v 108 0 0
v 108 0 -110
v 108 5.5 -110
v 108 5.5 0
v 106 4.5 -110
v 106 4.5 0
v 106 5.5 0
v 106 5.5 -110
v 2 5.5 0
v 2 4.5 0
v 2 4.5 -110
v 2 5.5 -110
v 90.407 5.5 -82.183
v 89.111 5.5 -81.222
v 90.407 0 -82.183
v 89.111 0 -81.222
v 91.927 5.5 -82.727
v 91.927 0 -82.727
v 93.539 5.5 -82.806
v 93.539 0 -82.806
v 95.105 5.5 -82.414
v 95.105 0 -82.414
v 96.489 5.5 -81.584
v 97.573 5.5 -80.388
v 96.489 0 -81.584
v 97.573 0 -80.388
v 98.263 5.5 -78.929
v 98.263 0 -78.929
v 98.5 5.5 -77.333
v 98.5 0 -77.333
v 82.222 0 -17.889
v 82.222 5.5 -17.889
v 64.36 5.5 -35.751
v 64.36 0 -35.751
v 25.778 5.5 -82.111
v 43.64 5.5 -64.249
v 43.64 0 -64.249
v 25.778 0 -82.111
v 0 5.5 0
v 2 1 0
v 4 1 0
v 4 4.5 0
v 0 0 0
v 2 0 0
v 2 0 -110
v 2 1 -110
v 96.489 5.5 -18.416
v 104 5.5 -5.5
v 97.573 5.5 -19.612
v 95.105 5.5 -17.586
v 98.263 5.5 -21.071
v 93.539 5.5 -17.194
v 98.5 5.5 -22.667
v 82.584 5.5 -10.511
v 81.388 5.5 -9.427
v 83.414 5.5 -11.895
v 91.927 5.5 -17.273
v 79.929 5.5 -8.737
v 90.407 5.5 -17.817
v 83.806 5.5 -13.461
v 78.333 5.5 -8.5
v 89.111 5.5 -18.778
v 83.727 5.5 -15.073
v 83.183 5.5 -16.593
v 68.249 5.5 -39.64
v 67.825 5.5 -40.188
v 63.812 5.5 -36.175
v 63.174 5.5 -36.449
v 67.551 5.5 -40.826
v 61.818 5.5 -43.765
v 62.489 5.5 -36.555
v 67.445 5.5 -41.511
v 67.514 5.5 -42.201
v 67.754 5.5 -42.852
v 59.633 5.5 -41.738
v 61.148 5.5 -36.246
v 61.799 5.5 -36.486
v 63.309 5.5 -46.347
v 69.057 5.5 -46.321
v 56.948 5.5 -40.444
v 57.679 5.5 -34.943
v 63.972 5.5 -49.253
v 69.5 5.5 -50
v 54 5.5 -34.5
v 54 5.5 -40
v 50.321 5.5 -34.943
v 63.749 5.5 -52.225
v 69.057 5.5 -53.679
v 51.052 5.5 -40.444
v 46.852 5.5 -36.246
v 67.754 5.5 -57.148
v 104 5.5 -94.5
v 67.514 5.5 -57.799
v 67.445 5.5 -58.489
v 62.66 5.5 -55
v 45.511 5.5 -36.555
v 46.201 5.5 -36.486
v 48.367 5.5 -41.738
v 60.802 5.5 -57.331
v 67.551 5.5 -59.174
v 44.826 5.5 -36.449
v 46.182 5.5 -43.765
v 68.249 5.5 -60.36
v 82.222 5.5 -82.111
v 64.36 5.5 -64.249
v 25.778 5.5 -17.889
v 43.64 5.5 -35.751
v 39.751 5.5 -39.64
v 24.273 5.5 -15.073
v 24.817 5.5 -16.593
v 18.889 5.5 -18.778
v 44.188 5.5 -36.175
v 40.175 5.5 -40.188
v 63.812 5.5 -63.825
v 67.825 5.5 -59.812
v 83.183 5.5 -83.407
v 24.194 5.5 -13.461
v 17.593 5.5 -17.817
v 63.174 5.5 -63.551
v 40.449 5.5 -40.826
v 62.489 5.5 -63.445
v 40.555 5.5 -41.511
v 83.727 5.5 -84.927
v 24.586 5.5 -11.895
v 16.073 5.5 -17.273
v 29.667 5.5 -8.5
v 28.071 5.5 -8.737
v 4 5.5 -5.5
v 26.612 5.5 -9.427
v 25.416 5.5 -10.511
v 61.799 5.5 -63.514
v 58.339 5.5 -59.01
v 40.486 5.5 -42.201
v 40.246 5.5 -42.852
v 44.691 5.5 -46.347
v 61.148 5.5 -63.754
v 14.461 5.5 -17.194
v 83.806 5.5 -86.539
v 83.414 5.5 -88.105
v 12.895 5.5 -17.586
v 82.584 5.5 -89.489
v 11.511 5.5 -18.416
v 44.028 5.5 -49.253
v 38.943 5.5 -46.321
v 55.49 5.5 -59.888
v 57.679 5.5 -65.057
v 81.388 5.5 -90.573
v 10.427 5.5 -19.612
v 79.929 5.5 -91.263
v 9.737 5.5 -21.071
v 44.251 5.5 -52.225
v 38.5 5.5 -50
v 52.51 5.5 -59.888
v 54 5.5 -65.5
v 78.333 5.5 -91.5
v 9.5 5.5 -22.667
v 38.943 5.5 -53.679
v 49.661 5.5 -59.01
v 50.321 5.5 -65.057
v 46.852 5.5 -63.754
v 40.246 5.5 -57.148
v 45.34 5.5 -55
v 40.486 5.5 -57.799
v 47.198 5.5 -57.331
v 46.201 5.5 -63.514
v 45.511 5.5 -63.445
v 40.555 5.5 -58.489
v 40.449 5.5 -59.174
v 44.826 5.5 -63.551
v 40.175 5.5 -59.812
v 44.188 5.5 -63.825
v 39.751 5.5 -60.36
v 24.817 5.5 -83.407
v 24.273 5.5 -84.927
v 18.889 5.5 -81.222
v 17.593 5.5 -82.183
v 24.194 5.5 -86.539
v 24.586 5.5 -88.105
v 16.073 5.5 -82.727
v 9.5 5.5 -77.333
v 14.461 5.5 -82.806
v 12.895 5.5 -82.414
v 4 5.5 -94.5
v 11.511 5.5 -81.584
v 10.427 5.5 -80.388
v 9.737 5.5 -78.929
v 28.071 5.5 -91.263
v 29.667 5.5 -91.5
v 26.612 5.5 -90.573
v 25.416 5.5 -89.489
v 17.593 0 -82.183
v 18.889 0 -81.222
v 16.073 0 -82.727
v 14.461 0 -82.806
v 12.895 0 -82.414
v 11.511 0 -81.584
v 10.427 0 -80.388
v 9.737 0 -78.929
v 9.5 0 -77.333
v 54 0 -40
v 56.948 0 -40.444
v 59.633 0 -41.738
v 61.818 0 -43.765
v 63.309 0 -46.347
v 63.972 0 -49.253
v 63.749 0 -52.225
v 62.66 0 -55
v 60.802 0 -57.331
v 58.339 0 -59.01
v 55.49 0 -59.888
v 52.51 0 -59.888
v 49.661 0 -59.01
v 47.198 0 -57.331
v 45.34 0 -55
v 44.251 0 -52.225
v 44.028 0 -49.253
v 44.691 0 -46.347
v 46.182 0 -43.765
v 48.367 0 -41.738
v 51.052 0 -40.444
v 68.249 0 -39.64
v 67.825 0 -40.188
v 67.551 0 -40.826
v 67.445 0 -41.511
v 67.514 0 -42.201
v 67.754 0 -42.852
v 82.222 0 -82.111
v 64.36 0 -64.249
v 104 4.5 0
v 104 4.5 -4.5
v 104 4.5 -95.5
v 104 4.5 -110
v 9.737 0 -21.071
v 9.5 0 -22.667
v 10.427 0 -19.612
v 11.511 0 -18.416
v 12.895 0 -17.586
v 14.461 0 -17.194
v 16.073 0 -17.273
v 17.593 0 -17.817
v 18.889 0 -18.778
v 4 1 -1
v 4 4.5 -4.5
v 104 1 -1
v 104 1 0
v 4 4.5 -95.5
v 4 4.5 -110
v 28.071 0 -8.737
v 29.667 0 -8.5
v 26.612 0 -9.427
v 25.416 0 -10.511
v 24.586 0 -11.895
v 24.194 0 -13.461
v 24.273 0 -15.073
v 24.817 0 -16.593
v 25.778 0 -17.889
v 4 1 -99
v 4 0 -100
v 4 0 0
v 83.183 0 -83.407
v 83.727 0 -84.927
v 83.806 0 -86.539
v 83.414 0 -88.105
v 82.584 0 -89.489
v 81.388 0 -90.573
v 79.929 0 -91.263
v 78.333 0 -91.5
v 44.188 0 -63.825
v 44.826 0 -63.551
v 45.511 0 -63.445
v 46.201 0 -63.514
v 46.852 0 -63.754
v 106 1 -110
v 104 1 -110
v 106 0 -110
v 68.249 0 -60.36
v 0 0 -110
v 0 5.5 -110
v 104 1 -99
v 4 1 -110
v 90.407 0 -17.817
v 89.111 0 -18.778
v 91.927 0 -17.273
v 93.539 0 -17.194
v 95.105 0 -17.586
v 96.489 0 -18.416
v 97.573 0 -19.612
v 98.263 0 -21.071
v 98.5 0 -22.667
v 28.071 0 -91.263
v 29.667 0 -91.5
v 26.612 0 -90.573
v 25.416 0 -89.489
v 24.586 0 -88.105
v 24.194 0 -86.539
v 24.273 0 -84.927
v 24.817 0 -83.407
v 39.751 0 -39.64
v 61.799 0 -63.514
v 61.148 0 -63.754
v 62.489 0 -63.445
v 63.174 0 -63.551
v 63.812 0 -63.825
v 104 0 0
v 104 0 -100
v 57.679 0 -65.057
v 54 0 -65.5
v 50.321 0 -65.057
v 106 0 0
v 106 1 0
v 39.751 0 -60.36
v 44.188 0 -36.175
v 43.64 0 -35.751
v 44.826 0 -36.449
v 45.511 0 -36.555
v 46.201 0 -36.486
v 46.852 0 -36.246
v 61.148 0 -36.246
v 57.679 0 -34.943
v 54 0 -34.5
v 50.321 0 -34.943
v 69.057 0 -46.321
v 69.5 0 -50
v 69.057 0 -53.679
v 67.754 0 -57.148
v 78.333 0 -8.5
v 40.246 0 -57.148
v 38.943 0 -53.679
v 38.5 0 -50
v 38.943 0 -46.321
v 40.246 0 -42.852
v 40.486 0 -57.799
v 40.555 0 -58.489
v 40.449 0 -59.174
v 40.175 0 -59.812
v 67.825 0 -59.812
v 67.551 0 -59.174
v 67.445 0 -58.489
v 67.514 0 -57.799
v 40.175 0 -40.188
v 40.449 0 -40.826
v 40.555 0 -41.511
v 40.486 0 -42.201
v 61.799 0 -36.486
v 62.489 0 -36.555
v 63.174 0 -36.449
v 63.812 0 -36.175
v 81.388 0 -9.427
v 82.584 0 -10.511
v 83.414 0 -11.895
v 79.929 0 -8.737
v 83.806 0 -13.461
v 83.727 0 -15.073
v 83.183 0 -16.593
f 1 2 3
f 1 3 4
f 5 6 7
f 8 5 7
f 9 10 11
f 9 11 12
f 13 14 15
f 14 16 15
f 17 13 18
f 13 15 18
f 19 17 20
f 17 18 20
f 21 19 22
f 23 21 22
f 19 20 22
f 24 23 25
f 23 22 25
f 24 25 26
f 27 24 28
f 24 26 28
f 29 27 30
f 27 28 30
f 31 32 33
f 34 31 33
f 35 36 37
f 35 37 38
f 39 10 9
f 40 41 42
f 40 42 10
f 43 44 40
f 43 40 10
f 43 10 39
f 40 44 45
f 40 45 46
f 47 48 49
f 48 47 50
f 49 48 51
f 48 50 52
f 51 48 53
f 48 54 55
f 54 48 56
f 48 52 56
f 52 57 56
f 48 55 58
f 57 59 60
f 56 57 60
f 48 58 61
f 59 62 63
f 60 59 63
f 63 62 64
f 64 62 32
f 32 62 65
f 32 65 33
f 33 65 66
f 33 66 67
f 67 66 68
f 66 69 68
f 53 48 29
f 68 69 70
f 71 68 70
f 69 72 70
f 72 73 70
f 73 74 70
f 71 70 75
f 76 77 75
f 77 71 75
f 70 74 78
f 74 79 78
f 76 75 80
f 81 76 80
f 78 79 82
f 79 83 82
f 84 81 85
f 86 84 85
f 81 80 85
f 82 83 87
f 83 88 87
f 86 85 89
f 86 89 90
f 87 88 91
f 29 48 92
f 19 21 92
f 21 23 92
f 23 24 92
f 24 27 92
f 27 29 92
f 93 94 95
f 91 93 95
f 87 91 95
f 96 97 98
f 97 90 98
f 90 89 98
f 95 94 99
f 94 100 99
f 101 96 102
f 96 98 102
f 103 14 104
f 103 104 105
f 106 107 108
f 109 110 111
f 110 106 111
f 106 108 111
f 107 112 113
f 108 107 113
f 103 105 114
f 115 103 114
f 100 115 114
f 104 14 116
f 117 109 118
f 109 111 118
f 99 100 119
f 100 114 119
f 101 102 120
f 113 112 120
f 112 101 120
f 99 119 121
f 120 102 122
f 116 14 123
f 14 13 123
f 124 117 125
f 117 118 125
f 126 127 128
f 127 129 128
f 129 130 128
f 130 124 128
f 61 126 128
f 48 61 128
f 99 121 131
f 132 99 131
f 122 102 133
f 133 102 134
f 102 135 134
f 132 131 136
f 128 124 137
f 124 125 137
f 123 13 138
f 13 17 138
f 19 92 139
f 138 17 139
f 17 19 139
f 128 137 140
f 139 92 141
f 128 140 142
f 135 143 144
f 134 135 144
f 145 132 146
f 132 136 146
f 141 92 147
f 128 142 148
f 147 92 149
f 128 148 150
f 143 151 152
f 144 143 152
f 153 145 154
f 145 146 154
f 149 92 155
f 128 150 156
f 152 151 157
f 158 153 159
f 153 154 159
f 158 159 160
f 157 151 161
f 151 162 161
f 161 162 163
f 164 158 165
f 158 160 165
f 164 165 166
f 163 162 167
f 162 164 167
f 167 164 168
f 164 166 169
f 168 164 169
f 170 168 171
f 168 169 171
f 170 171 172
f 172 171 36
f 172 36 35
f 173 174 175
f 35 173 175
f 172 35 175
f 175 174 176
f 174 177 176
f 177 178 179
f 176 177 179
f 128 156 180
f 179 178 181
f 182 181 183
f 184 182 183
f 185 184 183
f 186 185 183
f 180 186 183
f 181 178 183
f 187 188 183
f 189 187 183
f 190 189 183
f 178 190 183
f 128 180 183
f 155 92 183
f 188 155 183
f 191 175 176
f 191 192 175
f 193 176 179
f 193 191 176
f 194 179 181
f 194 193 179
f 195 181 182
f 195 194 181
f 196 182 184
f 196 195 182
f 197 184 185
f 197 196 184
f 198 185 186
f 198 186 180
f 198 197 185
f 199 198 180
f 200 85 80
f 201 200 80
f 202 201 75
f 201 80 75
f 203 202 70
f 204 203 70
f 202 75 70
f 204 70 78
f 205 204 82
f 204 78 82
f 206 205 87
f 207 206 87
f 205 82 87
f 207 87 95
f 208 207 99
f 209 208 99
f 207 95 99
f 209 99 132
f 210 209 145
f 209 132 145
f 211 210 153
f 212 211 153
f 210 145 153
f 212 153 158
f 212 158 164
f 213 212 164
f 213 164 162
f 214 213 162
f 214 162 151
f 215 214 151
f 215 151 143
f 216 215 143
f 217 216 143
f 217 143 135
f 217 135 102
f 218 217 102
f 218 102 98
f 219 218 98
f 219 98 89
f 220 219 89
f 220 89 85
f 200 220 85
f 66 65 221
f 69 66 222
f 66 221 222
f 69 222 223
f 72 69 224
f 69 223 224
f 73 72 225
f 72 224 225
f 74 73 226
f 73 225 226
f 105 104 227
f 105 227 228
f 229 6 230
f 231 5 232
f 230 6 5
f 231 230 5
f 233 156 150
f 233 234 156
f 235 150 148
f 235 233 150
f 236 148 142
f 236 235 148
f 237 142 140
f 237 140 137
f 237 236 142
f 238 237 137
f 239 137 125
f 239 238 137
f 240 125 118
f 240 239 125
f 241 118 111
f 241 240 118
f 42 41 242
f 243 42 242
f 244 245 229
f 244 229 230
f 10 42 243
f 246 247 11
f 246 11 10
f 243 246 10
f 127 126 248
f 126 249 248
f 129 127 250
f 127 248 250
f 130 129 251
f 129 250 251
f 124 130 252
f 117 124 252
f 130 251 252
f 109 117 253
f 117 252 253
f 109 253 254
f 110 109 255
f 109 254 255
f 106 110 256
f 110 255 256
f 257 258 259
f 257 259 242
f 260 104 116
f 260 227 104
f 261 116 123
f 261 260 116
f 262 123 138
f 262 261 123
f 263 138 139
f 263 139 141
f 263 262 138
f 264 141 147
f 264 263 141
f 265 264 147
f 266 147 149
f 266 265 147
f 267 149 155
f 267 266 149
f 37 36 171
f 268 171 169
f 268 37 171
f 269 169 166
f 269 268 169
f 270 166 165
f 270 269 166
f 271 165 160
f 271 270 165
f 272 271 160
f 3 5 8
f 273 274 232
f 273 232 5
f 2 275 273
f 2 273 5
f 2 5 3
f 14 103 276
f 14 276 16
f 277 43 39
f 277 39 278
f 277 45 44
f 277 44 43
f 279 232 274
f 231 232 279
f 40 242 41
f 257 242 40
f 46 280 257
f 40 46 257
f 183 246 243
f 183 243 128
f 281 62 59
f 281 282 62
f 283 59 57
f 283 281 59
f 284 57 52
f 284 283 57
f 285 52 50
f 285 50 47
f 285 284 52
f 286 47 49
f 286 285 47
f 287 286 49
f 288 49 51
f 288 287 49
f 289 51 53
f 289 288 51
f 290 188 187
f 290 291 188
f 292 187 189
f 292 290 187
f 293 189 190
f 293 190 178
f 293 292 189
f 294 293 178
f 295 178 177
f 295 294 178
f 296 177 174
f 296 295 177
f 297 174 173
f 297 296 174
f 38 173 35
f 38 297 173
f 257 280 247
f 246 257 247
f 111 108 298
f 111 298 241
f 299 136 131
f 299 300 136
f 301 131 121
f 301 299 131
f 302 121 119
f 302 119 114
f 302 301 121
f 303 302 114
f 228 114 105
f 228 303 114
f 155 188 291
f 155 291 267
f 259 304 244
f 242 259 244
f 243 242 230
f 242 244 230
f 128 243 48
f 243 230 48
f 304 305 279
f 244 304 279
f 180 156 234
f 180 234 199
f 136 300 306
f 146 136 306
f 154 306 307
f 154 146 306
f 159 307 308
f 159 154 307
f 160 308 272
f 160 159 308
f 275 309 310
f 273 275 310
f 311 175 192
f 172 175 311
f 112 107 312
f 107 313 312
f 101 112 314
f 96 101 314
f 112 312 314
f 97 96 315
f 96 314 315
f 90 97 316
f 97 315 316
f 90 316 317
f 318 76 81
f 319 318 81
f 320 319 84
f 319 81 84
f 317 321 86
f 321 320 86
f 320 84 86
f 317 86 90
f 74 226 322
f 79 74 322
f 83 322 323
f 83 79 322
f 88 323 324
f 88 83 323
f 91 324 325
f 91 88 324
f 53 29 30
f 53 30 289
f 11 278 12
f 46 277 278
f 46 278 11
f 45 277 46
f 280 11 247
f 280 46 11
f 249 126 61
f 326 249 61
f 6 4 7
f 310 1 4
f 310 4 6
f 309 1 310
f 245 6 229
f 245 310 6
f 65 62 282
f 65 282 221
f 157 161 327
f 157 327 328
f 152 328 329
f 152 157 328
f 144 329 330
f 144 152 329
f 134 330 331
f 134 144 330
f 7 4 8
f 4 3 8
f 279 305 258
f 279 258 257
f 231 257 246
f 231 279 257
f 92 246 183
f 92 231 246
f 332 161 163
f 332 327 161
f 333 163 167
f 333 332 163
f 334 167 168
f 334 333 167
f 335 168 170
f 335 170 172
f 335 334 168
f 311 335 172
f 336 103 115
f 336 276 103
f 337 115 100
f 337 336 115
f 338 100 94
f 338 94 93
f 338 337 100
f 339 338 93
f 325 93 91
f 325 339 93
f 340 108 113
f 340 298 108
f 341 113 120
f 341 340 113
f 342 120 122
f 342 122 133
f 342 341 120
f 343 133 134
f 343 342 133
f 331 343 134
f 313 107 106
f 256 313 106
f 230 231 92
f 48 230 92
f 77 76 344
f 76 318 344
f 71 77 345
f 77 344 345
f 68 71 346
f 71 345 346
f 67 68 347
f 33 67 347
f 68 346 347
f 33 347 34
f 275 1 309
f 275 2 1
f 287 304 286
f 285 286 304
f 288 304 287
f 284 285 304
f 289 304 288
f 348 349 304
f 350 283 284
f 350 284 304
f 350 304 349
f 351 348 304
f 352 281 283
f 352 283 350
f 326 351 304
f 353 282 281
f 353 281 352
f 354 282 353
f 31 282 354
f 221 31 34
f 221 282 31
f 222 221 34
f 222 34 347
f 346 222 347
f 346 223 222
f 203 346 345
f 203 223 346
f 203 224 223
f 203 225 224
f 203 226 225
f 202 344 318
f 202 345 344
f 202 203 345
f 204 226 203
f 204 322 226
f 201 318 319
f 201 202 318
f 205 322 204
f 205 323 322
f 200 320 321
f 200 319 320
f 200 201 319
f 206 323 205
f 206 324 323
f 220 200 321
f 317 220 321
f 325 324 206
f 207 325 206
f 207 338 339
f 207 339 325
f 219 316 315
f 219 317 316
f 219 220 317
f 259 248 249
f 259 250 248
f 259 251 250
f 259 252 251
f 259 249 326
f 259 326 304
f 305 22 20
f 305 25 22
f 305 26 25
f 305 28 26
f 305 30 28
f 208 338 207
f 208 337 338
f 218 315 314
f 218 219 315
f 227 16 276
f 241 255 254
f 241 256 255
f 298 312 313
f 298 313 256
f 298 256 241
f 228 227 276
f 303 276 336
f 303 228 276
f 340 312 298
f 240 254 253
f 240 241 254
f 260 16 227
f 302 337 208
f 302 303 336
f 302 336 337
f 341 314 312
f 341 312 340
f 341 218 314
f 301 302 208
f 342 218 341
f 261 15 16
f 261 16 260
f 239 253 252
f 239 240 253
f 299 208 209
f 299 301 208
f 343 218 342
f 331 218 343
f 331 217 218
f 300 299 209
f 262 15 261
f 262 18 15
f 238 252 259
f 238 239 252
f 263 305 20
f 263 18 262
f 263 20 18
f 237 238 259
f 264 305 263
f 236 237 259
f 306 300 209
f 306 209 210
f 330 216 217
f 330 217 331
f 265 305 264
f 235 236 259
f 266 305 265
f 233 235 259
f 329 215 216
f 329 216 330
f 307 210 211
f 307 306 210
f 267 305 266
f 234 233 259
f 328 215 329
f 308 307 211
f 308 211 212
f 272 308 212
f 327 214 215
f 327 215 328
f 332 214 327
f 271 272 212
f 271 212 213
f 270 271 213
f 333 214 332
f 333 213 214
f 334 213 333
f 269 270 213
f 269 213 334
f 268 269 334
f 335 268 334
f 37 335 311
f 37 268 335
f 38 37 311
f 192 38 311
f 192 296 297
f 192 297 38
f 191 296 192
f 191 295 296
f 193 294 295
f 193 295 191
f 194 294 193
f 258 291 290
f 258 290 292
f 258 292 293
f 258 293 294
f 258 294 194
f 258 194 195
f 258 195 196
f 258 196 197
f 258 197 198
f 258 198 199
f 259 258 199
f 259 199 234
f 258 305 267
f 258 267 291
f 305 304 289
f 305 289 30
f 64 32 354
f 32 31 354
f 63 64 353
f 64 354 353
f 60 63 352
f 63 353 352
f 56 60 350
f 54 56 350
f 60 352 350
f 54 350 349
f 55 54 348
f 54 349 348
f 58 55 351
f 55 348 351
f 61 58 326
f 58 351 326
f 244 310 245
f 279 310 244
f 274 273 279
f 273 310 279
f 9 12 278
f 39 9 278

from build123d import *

# Parameters (mm, degrees)
BOSS_EXTRUDE1_DEPTH = 5.5
SKETCH4_W           = 2
SKETCH4_H           = 1
CUT_EXTRUDE2_DEPTH  = 110
SKETCH5_R           = 10
CUT_EXTRUDE3_DEPTH  = 110
CUT_EXTRUDE4_START  = -4
CUT_EXTRUDE4_DEPTH  = 100
FILLET3_R           = 5.5
FILLET4_R           = 2.75


with BuildPart() as part:
    # Sketch1 → Boss-Extrude1 (new body)
    with BuildSketch(Plane(origin=(0, 0, 0), x_dir=(1, 0, 0), z_dir=(0, 1, 0))):
        Polygon((0, 110), (4, 110), (4, 100), (104, 100), (104, 110), (108, 110), (108, 0), (0, 0), align=None)
    extrude(amount=BOSS_EXTRUDE1_DEPTH)

    # Sketch4 → Cut-Extrude2 (cut)
    with BuildSketch(Plane(origin=(0, 0, -110), x_dir=(-1, 0, 0), z_dir=(0, 0, -1))):
        with Locations((-3, 0.5)):
            Rectangle(SKETCH4_W, SKETCH4_H)
        with Locations((-3, 5)):
            Rectangle(SKETCH4_W, SKETCH4_H)
        with Locations((-105, 5)):
            Rectangle(SKETCH4_W, SKETCH4_H)
        with Locations((-105, 0.5)):
            Rectangle(SKETCH4_W, SKETCH4_H)
    extrude(amount=-CUT_EXTRUDE2_DEPTH, mode=Mode.SUBTRACT)

    # Sketch5 → Cut-Extrude3 (cut)
    with BuildSketch(Plane(origin=(0, 5.5, 0), x_dir=(1, 0, 0), z_dir=(0, 1, 0))):
        with Locations(Location((54, 50, 0), (0, 0, 270))):
            Circle(SKETCH5_R)
        with BuildLine():
            Line((41.269180349, 41.158267646), (9.5, 9.389087297))
            Line((9.5, 9.389087297), (9.5, 90.610912703))
            Line((9.5, 90.610912703), (41.269180349, 58.841732354))
            ThreePointArc((41.269180349, 58.841732354), (38.5, 50), (41.269180349, 41.158267646))
        make_face()
        with BuildLine():
            Line((98.5, 90.610912703), (98.5, 9.389087297))
            Line((98.5, 9.389087297), (66.730819651, 41.158267646))
            ThreePointArc((66.730819651, 41.158267646), (69.5, 50), (66.730819651, 58.841732354))
            Line((66.730819651, 58.841732354), (98.5, 90.610912703))
        make_face()
        with BuildLine():
            Line((45.158267646, 62.730819651), (16.389087297, 91.5))
            Line((16.389087297, 91.5), (91.610912703, 91.5))
            Line((91.610912703, 91.5), (62.841732354, 62.730819651))
            ThreePointArc((62.841732354, 62.730819651), (54, 65.5), (45.158267646, 62.730819651))
        make_face()
        with BuildLine():
            Line((16.389087297, 8.5), (91.610912703, 8.5))
            Line((91.610912703, 8.5), (62.841732354, 37.269180349))
            ThreePointArc((62.841732354, 37.269180349), (54, 34.5), (45.158267646, 37.269180349))
            Line((45.158267646, 37.269180349), (16.389087297, 8.5))
        make_face()
    extrude(amount=-CUT_EXTRUDE3_DEPTH, mode=Mode.SUBTRACT)

    # Sketch6 → Cut-Extrude4 (cut)
    with BuildSketch(Plane(origin=(108, 0, 0), x_dir=(0, 0, -1), z_dir=(1, 0, 0)).offset(CUT_EXTRUDE4_START)):
        Polygon((0, 0), (5.5, 5.5), (0, 5.5), align=None)
        Polygon((100, 5.5), (100, 0), (94.5, 5.5), align=None)
    extrude(amount=-CUT_EXTRUDE4_DEPTH, mode=Mode.SUBTRACT)

    # Fillet3
    fillet3_edges = [part.edges().sort_by_distance(p)[0] for p in [
        (16.389087297, 2.75, -91.5),
        (91.610912703, 2.75, -91.5),
        (9.5, 2.75, -9.389087297),
        (9.5, 2.75, -90.610912703),
        (98.5, 2.75, -90.610912703),
        (98.5, 2.75, -9.389087297),
        (16.389087297, 2.75, -8.5),
        (91.610912703, 2.75, -8.5),
    ]]
    fillet(fillet3_edges, radius=FILLET3_R)

    # Fillet4
    fillet4_edges = [part.edges().sort_by_distance(p)[0] for p in [
        (62.841732354, 2.75, -62.730819651),
        (45.158267646, 2.75, -62.730819651),
        (41.269180349, 2.75, -58.841732354),
        (41.269180349, 2.75, -41.158267646),
        (66.730819651, 2.75, -41.158267646),
        (66.730819651, 2.75, -58.841732354),
        (45.158267646, 2.75, -37.269180349),
        (62.841732354, 2.75, -37.269180349),
    ]]
    fillet(fillet4_edges, radius=FILLET4_R)


solid = part.part
